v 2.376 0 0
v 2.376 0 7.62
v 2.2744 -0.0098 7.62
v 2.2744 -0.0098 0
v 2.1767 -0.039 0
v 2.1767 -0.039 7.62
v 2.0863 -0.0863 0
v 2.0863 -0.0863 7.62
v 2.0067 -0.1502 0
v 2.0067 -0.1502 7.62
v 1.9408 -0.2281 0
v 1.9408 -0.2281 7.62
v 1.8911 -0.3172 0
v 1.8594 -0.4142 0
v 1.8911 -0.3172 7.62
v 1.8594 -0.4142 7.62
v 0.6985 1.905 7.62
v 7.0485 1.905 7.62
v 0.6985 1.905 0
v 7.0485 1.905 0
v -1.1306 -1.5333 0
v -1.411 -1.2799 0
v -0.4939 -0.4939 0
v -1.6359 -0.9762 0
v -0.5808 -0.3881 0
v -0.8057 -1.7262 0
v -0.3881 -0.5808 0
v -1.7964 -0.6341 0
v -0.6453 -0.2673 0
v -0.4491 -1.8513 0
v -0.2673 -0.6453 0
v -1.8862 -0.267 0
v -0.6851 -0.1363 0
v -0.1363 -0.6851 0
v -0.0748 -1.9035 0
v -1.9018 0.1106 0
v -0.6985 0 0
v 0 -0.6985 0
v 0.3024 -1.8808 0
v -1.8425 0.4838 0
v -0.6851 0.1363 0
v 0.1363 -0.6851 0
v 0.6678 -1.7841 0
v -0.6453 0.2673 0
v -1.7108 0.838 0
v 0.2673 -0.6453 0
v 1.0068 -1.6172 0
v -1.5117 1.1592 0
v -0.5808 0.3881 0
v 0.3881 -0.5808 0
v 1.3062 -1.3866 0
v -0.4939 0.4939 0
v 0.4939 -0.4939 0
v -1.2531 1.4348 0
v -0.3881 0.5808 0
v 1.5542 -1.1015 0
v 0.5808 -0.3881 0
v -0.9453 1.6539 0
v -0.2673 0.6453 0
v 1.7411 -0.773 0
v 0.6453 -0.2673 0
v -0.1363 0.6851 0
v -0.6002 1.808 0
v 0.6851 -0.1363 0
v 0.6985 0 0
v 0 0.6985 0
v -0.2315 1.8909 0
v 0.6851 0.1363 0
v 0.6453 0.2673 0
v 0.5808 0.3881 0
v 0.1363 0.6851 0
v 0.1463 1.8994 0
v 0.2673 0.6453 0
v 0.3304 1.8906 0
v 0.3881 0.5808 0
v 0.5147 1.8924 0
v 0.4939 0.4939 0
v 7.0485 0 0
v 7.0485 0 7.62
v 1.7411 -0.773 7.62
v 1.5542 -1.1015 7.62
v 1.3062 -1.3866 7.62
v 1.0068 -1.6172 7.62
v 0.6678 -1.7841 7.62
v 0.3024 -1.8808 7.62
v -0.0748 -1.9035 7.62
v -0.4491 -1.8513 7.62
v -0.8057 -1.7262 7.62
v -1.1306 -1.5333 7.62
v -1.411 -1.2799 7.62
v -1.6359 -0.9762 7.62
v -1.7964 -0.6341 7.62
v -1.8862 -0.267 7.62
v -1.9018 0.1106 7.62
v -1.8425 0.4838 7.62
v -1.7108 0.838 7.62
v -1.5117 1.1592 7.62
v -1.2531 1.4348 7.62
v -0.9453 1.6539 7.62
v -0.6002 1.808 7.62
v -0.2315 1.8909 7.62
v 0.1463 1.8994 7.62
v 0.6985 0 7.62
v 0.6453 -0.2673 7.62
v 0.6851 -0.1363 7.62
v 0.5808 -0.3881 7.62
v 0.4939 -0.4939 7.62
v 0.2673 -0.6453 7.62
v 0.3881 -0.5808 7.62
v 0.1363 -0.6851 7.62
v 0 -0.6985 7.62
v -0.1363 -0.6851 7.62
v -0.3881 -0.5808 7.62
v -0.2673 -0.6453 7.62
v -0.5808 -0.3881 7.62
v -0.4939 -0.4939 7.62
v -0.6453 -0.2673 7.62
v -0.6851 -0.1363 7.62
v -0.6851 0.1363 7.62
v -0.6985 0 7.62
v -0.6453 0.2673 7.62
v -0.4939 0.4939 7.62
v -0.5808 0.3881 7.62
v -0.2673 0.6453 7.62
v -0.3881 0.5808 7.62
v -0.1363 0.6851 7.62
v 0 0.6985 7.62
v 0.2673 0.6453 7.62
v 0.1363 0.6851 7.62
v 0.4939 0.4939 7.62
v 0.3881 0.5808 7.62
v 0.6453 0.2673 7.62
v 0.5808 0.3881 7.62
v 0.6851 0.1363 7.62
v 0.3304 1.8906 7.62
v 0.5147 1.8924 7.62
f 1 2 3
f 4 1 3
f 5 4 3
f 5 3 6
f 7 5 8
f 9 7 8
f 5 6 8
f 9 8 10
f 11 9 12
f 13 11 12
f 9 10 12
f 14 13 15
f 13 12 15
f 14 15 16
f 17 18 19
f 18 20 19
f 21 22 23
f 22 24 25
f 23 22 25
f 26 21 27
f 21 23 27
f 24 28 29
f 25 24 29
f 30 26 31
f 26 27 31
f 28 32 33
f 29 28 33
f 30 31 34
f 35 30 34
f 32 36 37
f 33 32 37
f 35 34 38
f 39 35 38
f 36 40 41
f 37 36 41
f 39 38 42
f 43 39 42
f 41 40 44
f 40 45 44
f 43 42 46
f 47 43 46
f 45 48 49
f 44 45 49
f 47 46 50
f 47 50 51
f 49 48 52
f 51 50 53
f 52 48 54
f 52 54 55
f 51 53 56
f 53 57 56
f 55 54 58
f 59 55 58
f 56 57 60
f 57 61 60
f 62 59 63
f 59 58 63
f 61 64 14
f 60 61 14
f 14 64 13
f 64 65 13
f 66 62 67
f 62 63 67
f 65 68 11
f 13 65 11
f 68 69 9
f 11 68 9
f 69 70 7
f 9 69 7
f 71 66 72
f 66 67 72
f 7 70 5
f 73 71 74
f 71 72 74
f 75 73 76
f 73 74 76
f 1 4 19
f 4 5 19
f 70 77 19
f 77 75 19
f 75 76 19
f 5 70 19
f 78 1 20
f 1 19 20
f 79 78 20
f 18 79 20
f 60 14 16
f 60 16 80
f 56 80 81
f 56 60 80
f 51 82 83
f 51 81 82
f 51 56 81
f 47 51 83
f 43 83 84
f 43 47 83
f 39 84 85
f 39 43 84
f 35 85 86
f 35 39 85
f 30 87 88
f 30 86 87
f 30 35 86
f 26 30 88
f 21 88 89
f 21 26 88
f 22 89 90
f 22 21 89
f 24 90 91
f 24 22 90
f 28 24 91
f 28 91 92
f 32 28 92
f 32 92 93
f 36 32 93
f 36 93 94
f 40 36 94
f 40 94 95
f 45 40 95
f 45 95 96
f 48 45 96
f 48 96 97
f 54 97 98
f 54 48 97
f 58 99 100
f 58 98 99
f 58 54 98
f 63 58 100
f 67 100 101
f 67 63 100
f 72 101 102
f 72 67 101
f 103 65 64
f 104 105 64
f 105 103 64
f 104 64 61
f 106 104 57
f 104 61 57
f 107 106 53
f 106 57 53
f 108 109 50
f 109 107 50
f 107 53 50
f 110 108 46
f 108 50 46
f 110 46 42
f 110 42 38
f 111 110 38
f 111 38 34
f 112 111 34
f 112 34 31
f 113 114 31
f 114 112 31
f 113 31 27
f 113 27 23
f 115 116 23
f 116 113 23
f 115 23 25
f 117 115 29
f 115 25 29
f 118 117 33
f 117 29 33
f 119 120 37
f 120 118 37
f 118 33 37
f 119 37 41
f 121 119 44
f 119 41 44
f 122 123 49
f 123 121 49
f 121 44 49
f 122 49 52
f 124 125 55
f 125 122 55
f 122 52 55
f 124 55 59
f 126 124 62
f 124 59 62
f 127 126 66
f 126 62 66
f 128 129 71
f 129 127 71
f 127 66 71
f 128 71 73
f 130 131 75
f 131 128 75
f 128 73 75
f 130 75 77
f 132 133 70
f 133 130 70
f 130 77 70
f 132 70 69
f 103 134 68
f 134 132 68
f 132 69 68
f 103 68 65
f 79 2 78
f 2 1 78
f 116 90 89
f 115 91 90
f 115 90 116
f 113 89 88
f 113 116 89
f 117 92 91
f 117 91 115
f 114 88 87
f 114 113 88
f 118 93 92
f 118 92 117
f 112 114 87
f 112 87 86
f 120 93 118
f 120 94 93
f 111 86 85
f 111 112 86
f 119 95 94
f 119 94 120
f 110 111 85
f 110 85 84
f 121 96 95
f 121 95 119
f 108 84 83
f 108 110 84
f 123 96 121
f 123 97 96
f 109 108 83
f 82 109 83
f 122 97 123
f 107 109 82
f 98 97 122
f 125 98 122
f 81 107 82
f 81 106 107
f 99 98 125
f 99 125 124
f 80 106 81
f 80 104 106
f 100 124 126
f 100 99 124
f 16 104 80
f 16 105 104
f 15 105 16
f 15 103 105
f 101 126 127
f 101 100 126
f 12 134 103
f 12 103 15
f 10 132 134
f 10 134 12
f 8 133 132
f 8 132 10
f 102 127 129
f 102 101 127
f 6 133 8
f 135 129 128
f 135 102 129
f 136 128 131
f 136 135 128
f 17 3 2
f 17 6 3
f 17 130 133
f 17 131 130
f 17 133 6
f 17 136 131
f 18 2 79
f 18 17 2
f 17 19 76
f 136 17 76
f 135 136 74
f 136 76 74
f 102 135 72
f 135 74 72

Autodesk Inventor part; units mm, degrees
ref_plane "YZ Plane" through (0, 0, 0) normal (1, 0, 0) x (0, 1, 0)
ref_plane "XZ Plane" through (0, 0, 0) normal (0, 1, 0) x (-1, 0, 0)
ref_plane "XY Plane" through (0, 0, 0) normal (0, 0, 1) x (1, 0, 0)
sketch "Sketch1" plane through (0, 0, 0) normal (0, 0, 1) x (1, 0, 0)
  circle A0 centre (0, 0) radius 0.6985
  circle A1 centre (0, 0) radius 1.905
  line L0 (0.6985, 0) -> (7.0485, 0)
  line L1 (7.0485, 0) -> (7.0485, 1.905)
  line L2 (7.0485, 1.905) -> (0.6985, 1.905)
  line L3 (0.6985, 1.905) -> (0.6985, 0)
  point P0 (0.6985, 1.7723)
  point P1 (1.905, 0)
  dimension "d0" = 1.397
  dimension "d1" = 3.81
  dimension "d4" = 6.35
  dimension "d5" = 1.905
extrude "Extrusion1" add sketch "Sketch1" along normal blind 7.62
fillet "Fillet1" radius 3.175 1 edges at (0.6985, 1.7723, 3.81)
fillet "Fillet2" radius 0.5292 1 edges at (1.905, 0, 3.81)
properties part number "innerhinge"
